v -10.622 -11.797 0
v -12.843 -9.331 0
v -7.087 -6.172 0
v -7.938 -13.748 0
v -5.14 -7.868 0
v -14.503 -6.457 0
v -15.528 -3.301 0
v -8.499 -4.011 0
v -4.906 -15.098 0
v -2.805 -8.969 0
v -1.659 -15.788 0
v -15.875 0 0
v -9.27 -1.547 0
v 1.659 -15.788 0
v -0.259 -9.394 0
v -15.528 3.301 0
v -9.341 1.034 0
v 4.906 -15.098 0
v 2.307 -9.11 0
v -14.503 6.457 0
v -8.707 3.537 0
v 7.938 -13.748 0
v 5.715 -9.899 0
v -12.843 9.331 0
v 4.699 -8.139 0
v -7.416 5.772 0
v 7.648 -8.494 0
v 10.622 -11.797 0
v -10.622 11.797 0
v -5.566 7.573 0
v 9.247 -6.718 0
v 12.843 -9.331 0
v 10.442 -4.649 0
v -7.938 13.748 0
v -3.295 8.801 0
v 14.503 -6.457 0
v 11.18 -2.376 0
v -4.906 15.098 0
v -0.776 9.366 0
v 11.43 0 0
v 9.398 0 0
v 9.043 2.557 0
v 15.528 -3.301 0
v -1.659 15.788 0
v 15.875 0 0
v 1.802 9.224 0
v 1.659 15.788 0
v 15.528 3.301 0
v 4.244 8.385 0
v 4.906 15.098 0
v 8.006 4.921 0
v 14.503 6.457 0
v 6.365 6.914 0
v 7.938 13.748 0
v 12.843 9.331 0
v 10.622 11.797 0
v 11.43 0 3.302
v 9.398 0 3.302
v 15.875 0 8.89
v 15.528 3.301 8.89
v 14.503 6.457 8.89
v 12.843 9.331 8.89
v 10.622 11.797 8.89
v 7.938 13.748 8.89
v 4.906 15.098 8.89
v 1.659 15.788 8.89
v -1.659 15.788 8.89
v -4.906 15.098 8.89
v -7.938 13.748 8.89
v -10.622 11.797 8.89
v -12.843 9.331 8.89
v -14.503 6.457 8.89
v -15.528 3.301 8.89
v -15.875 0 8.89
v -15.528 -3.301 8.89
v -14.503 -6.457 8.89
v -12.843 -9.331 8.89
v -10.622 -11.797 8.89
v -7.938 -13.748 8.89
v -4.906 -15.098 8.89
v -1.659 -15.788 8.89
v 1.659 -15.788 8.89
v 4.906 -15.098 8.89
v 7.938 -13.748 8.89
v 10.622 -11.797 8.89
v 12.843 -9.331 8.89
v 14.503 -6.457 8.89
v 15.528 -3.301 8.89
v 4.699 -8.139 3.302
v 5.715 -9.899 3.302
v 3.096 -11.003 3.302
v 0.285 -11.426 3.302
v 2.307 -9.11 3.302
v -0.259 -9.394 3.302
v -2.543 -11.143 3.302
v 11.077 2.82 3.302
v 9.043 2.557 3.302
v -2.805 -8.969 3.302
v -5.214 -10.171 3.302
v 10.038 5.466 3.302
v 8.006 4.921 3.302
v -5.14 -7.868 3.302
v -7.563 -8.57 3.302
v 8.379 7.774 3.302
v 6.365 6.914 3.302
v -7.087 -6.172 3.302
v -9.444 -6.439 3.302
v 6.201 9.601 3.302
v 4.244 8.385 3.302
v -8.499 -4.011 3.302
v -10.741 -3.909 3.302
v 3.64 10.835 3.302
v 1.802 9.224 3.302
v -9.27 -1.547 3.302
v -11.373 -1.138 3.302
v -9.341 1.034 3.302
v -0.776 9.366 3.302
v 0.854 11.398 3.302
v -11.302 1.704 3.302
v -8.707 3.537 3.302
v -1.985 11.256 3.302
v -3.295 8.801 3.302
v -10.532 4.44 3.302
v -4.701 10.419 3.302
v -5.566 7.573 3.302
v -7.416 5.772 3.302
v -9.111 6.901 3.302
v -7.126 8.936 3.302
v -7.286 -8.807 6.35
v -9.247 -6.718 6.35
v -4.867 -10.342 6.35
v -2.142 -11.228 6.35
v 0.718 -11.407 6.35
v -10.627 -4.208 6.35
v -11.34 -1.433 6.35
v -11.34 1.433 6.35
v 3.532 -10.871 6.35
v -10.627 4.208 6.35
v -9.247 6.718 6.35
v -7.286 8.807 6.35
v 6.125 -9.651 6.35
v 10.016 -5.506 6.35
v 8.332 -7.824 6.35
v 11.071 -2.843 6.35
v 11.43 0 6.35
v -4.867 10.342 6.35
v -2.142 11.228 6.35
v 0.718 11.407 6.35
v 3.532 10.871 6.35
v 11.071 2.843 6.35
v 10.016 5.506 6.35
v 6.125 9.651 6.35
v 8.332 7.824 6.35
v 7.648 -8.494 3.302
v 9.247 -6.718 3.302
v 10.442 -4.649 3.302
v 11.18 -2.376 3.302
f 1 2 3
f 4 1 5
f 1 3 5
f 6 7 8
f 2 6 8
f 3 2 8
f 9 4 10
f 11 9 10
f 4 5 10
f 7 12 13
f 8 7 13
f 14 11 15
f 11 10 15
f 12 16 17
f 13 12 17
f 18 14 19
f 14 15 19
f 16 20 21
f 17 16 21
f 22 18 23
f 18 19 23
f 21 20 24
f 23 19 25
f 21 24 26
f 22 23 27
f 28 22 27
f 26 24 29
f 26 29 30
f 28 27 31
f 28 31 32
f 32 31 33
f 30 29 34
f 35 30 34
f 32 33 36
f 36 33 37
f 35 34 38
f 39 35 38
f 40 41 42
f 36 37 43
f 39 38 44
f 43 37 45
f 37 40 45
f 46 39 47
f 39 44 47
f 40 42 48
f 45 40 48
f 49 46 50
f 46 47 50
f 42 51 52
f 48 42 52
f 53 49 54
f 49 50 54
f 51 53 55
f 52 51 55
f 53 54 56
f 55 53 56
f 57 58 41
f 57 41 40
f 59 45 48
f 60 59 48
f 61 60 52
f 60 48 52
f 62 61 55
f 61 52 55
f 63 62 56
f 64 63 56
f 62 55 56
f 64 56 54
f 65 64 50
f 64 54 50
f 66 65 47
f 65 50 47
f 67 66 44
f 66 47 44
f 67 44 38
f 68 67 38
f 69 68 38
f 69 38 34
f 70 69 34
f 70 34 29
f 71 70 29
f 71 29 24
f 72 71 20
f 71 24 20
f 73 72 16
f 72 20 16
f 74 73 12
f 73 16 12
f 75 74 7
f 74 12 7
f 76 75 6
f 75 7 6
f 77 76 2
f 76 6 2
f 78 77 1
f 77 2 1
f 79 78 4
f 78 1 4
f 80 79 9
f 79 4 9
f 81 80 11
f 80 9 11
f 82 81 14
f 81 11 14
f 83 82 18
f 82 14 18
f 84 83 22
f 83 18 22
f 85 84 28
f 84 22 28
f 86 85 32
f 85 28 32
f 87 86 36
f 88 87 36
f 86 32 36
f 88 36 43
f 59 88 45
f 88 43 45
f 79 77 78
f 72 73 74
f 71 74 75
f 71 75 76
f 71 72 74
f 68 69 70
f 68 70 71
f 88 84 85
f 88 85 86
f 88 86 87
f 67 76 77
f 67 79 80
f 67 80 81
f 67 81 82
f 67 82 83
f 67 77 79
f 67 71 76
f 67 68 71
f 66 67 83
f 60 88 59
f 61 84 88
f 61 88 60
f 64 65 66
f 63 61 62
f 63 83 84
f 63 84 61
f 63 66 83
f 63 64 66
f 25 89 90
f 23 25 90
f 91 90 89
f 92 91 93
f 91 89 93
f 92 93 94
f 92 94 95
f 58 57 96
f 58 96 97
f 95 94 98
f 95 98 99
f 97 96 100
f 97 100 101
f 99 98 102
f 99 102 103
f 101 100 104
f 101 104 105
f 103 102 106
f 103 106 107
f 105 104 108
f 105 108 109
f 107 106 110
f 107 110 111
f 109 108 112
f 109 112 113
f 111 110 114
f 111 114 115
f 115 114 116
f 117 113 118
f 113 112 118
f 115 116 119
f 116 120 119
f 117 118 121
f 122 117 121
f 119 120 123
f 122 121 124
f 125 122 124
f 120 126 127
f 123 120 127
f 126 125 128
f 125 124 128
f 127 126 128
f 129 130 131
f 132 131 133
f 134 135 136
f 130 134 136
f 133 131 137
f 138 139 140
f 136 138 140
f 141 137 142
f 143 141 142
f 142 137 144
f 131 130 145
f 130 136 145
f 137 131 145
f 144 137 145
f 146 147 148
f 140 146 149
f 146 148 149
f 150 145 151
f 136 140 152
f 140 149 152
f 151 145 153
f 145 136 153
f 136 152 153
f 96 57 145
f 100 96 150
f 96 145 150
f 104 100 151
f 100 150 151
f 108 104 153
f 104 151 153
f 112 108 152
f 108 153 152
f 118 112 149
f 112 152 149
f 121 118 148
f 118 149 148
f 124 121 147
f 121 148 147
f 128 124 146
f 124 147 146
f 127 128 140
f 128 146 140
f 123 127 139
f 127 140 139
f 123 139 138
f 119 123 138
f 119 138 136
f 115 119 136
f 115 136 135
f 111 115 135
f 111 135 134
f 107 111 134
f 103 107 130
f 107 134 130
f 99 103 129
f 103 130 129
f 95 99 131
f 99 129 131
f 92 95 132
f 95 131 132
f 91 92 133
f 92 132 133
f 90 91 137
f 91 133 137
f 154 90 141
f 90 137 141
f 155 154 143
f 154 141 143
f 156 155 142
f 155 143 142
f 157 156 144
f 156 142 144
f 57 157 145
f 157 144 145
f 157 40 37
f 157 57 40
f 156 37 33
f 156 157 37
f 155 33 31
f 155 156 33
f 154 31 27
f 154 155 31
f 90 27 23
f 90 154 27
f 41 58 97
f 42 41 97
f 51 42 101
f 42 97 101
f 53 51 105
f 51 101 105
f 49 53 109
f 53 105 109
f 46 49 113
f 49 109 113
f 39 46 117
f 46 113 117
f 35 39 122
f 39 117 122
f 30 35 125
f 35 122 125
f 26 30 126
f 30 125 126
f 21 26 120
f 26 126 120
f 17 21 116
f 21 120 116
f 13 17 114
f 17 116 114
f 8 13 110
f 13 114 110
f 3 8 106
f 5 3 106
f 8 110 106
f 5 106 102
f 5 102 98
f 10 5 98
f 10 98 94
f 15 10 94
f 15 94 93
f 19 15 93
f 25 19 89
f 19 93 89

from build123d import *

# Parameters (mm, degrees)
F0_R     = 15.875
F1_DEPTH = 8.89
F4_W     = 2.032
F4_H     = 3.302
F5_ANGLE = -60


with BuildPart() as f1:
    # F0 (on Top) → F1 (new body)
    with BuildSketch(Plane.XY):
        Circle(F0_R)
    extrude(amount=F1_DEPTH)

    # F2 (on Front) → F3 (revolve, cut)
    with BuildSketch(Plane.XZ):
        Polygon((11.43, 6.35), (0, 6.35), (0, 0), (9.398, 0), (9.398, 3.302), (11.43, 3.302), align=None)
    revolve(axis=Axis((0, 0, 3.175), (0, 0, 1)), mode=Mode.SUBTRACT)

    # F4 (on Front) → F5 (revolve, cut)
    with BuildSketch(Plane.XZ):
        with Locations((10.414, 1.651)):
            Rectangle(F4_W, F4_H)
    revolve(axis=Axis((0, 0, 3.175), (0, 0, 1)), revolution_arc=F5_ANGLE, mode=Mode.SUBTRACT)


solid = f1.part
